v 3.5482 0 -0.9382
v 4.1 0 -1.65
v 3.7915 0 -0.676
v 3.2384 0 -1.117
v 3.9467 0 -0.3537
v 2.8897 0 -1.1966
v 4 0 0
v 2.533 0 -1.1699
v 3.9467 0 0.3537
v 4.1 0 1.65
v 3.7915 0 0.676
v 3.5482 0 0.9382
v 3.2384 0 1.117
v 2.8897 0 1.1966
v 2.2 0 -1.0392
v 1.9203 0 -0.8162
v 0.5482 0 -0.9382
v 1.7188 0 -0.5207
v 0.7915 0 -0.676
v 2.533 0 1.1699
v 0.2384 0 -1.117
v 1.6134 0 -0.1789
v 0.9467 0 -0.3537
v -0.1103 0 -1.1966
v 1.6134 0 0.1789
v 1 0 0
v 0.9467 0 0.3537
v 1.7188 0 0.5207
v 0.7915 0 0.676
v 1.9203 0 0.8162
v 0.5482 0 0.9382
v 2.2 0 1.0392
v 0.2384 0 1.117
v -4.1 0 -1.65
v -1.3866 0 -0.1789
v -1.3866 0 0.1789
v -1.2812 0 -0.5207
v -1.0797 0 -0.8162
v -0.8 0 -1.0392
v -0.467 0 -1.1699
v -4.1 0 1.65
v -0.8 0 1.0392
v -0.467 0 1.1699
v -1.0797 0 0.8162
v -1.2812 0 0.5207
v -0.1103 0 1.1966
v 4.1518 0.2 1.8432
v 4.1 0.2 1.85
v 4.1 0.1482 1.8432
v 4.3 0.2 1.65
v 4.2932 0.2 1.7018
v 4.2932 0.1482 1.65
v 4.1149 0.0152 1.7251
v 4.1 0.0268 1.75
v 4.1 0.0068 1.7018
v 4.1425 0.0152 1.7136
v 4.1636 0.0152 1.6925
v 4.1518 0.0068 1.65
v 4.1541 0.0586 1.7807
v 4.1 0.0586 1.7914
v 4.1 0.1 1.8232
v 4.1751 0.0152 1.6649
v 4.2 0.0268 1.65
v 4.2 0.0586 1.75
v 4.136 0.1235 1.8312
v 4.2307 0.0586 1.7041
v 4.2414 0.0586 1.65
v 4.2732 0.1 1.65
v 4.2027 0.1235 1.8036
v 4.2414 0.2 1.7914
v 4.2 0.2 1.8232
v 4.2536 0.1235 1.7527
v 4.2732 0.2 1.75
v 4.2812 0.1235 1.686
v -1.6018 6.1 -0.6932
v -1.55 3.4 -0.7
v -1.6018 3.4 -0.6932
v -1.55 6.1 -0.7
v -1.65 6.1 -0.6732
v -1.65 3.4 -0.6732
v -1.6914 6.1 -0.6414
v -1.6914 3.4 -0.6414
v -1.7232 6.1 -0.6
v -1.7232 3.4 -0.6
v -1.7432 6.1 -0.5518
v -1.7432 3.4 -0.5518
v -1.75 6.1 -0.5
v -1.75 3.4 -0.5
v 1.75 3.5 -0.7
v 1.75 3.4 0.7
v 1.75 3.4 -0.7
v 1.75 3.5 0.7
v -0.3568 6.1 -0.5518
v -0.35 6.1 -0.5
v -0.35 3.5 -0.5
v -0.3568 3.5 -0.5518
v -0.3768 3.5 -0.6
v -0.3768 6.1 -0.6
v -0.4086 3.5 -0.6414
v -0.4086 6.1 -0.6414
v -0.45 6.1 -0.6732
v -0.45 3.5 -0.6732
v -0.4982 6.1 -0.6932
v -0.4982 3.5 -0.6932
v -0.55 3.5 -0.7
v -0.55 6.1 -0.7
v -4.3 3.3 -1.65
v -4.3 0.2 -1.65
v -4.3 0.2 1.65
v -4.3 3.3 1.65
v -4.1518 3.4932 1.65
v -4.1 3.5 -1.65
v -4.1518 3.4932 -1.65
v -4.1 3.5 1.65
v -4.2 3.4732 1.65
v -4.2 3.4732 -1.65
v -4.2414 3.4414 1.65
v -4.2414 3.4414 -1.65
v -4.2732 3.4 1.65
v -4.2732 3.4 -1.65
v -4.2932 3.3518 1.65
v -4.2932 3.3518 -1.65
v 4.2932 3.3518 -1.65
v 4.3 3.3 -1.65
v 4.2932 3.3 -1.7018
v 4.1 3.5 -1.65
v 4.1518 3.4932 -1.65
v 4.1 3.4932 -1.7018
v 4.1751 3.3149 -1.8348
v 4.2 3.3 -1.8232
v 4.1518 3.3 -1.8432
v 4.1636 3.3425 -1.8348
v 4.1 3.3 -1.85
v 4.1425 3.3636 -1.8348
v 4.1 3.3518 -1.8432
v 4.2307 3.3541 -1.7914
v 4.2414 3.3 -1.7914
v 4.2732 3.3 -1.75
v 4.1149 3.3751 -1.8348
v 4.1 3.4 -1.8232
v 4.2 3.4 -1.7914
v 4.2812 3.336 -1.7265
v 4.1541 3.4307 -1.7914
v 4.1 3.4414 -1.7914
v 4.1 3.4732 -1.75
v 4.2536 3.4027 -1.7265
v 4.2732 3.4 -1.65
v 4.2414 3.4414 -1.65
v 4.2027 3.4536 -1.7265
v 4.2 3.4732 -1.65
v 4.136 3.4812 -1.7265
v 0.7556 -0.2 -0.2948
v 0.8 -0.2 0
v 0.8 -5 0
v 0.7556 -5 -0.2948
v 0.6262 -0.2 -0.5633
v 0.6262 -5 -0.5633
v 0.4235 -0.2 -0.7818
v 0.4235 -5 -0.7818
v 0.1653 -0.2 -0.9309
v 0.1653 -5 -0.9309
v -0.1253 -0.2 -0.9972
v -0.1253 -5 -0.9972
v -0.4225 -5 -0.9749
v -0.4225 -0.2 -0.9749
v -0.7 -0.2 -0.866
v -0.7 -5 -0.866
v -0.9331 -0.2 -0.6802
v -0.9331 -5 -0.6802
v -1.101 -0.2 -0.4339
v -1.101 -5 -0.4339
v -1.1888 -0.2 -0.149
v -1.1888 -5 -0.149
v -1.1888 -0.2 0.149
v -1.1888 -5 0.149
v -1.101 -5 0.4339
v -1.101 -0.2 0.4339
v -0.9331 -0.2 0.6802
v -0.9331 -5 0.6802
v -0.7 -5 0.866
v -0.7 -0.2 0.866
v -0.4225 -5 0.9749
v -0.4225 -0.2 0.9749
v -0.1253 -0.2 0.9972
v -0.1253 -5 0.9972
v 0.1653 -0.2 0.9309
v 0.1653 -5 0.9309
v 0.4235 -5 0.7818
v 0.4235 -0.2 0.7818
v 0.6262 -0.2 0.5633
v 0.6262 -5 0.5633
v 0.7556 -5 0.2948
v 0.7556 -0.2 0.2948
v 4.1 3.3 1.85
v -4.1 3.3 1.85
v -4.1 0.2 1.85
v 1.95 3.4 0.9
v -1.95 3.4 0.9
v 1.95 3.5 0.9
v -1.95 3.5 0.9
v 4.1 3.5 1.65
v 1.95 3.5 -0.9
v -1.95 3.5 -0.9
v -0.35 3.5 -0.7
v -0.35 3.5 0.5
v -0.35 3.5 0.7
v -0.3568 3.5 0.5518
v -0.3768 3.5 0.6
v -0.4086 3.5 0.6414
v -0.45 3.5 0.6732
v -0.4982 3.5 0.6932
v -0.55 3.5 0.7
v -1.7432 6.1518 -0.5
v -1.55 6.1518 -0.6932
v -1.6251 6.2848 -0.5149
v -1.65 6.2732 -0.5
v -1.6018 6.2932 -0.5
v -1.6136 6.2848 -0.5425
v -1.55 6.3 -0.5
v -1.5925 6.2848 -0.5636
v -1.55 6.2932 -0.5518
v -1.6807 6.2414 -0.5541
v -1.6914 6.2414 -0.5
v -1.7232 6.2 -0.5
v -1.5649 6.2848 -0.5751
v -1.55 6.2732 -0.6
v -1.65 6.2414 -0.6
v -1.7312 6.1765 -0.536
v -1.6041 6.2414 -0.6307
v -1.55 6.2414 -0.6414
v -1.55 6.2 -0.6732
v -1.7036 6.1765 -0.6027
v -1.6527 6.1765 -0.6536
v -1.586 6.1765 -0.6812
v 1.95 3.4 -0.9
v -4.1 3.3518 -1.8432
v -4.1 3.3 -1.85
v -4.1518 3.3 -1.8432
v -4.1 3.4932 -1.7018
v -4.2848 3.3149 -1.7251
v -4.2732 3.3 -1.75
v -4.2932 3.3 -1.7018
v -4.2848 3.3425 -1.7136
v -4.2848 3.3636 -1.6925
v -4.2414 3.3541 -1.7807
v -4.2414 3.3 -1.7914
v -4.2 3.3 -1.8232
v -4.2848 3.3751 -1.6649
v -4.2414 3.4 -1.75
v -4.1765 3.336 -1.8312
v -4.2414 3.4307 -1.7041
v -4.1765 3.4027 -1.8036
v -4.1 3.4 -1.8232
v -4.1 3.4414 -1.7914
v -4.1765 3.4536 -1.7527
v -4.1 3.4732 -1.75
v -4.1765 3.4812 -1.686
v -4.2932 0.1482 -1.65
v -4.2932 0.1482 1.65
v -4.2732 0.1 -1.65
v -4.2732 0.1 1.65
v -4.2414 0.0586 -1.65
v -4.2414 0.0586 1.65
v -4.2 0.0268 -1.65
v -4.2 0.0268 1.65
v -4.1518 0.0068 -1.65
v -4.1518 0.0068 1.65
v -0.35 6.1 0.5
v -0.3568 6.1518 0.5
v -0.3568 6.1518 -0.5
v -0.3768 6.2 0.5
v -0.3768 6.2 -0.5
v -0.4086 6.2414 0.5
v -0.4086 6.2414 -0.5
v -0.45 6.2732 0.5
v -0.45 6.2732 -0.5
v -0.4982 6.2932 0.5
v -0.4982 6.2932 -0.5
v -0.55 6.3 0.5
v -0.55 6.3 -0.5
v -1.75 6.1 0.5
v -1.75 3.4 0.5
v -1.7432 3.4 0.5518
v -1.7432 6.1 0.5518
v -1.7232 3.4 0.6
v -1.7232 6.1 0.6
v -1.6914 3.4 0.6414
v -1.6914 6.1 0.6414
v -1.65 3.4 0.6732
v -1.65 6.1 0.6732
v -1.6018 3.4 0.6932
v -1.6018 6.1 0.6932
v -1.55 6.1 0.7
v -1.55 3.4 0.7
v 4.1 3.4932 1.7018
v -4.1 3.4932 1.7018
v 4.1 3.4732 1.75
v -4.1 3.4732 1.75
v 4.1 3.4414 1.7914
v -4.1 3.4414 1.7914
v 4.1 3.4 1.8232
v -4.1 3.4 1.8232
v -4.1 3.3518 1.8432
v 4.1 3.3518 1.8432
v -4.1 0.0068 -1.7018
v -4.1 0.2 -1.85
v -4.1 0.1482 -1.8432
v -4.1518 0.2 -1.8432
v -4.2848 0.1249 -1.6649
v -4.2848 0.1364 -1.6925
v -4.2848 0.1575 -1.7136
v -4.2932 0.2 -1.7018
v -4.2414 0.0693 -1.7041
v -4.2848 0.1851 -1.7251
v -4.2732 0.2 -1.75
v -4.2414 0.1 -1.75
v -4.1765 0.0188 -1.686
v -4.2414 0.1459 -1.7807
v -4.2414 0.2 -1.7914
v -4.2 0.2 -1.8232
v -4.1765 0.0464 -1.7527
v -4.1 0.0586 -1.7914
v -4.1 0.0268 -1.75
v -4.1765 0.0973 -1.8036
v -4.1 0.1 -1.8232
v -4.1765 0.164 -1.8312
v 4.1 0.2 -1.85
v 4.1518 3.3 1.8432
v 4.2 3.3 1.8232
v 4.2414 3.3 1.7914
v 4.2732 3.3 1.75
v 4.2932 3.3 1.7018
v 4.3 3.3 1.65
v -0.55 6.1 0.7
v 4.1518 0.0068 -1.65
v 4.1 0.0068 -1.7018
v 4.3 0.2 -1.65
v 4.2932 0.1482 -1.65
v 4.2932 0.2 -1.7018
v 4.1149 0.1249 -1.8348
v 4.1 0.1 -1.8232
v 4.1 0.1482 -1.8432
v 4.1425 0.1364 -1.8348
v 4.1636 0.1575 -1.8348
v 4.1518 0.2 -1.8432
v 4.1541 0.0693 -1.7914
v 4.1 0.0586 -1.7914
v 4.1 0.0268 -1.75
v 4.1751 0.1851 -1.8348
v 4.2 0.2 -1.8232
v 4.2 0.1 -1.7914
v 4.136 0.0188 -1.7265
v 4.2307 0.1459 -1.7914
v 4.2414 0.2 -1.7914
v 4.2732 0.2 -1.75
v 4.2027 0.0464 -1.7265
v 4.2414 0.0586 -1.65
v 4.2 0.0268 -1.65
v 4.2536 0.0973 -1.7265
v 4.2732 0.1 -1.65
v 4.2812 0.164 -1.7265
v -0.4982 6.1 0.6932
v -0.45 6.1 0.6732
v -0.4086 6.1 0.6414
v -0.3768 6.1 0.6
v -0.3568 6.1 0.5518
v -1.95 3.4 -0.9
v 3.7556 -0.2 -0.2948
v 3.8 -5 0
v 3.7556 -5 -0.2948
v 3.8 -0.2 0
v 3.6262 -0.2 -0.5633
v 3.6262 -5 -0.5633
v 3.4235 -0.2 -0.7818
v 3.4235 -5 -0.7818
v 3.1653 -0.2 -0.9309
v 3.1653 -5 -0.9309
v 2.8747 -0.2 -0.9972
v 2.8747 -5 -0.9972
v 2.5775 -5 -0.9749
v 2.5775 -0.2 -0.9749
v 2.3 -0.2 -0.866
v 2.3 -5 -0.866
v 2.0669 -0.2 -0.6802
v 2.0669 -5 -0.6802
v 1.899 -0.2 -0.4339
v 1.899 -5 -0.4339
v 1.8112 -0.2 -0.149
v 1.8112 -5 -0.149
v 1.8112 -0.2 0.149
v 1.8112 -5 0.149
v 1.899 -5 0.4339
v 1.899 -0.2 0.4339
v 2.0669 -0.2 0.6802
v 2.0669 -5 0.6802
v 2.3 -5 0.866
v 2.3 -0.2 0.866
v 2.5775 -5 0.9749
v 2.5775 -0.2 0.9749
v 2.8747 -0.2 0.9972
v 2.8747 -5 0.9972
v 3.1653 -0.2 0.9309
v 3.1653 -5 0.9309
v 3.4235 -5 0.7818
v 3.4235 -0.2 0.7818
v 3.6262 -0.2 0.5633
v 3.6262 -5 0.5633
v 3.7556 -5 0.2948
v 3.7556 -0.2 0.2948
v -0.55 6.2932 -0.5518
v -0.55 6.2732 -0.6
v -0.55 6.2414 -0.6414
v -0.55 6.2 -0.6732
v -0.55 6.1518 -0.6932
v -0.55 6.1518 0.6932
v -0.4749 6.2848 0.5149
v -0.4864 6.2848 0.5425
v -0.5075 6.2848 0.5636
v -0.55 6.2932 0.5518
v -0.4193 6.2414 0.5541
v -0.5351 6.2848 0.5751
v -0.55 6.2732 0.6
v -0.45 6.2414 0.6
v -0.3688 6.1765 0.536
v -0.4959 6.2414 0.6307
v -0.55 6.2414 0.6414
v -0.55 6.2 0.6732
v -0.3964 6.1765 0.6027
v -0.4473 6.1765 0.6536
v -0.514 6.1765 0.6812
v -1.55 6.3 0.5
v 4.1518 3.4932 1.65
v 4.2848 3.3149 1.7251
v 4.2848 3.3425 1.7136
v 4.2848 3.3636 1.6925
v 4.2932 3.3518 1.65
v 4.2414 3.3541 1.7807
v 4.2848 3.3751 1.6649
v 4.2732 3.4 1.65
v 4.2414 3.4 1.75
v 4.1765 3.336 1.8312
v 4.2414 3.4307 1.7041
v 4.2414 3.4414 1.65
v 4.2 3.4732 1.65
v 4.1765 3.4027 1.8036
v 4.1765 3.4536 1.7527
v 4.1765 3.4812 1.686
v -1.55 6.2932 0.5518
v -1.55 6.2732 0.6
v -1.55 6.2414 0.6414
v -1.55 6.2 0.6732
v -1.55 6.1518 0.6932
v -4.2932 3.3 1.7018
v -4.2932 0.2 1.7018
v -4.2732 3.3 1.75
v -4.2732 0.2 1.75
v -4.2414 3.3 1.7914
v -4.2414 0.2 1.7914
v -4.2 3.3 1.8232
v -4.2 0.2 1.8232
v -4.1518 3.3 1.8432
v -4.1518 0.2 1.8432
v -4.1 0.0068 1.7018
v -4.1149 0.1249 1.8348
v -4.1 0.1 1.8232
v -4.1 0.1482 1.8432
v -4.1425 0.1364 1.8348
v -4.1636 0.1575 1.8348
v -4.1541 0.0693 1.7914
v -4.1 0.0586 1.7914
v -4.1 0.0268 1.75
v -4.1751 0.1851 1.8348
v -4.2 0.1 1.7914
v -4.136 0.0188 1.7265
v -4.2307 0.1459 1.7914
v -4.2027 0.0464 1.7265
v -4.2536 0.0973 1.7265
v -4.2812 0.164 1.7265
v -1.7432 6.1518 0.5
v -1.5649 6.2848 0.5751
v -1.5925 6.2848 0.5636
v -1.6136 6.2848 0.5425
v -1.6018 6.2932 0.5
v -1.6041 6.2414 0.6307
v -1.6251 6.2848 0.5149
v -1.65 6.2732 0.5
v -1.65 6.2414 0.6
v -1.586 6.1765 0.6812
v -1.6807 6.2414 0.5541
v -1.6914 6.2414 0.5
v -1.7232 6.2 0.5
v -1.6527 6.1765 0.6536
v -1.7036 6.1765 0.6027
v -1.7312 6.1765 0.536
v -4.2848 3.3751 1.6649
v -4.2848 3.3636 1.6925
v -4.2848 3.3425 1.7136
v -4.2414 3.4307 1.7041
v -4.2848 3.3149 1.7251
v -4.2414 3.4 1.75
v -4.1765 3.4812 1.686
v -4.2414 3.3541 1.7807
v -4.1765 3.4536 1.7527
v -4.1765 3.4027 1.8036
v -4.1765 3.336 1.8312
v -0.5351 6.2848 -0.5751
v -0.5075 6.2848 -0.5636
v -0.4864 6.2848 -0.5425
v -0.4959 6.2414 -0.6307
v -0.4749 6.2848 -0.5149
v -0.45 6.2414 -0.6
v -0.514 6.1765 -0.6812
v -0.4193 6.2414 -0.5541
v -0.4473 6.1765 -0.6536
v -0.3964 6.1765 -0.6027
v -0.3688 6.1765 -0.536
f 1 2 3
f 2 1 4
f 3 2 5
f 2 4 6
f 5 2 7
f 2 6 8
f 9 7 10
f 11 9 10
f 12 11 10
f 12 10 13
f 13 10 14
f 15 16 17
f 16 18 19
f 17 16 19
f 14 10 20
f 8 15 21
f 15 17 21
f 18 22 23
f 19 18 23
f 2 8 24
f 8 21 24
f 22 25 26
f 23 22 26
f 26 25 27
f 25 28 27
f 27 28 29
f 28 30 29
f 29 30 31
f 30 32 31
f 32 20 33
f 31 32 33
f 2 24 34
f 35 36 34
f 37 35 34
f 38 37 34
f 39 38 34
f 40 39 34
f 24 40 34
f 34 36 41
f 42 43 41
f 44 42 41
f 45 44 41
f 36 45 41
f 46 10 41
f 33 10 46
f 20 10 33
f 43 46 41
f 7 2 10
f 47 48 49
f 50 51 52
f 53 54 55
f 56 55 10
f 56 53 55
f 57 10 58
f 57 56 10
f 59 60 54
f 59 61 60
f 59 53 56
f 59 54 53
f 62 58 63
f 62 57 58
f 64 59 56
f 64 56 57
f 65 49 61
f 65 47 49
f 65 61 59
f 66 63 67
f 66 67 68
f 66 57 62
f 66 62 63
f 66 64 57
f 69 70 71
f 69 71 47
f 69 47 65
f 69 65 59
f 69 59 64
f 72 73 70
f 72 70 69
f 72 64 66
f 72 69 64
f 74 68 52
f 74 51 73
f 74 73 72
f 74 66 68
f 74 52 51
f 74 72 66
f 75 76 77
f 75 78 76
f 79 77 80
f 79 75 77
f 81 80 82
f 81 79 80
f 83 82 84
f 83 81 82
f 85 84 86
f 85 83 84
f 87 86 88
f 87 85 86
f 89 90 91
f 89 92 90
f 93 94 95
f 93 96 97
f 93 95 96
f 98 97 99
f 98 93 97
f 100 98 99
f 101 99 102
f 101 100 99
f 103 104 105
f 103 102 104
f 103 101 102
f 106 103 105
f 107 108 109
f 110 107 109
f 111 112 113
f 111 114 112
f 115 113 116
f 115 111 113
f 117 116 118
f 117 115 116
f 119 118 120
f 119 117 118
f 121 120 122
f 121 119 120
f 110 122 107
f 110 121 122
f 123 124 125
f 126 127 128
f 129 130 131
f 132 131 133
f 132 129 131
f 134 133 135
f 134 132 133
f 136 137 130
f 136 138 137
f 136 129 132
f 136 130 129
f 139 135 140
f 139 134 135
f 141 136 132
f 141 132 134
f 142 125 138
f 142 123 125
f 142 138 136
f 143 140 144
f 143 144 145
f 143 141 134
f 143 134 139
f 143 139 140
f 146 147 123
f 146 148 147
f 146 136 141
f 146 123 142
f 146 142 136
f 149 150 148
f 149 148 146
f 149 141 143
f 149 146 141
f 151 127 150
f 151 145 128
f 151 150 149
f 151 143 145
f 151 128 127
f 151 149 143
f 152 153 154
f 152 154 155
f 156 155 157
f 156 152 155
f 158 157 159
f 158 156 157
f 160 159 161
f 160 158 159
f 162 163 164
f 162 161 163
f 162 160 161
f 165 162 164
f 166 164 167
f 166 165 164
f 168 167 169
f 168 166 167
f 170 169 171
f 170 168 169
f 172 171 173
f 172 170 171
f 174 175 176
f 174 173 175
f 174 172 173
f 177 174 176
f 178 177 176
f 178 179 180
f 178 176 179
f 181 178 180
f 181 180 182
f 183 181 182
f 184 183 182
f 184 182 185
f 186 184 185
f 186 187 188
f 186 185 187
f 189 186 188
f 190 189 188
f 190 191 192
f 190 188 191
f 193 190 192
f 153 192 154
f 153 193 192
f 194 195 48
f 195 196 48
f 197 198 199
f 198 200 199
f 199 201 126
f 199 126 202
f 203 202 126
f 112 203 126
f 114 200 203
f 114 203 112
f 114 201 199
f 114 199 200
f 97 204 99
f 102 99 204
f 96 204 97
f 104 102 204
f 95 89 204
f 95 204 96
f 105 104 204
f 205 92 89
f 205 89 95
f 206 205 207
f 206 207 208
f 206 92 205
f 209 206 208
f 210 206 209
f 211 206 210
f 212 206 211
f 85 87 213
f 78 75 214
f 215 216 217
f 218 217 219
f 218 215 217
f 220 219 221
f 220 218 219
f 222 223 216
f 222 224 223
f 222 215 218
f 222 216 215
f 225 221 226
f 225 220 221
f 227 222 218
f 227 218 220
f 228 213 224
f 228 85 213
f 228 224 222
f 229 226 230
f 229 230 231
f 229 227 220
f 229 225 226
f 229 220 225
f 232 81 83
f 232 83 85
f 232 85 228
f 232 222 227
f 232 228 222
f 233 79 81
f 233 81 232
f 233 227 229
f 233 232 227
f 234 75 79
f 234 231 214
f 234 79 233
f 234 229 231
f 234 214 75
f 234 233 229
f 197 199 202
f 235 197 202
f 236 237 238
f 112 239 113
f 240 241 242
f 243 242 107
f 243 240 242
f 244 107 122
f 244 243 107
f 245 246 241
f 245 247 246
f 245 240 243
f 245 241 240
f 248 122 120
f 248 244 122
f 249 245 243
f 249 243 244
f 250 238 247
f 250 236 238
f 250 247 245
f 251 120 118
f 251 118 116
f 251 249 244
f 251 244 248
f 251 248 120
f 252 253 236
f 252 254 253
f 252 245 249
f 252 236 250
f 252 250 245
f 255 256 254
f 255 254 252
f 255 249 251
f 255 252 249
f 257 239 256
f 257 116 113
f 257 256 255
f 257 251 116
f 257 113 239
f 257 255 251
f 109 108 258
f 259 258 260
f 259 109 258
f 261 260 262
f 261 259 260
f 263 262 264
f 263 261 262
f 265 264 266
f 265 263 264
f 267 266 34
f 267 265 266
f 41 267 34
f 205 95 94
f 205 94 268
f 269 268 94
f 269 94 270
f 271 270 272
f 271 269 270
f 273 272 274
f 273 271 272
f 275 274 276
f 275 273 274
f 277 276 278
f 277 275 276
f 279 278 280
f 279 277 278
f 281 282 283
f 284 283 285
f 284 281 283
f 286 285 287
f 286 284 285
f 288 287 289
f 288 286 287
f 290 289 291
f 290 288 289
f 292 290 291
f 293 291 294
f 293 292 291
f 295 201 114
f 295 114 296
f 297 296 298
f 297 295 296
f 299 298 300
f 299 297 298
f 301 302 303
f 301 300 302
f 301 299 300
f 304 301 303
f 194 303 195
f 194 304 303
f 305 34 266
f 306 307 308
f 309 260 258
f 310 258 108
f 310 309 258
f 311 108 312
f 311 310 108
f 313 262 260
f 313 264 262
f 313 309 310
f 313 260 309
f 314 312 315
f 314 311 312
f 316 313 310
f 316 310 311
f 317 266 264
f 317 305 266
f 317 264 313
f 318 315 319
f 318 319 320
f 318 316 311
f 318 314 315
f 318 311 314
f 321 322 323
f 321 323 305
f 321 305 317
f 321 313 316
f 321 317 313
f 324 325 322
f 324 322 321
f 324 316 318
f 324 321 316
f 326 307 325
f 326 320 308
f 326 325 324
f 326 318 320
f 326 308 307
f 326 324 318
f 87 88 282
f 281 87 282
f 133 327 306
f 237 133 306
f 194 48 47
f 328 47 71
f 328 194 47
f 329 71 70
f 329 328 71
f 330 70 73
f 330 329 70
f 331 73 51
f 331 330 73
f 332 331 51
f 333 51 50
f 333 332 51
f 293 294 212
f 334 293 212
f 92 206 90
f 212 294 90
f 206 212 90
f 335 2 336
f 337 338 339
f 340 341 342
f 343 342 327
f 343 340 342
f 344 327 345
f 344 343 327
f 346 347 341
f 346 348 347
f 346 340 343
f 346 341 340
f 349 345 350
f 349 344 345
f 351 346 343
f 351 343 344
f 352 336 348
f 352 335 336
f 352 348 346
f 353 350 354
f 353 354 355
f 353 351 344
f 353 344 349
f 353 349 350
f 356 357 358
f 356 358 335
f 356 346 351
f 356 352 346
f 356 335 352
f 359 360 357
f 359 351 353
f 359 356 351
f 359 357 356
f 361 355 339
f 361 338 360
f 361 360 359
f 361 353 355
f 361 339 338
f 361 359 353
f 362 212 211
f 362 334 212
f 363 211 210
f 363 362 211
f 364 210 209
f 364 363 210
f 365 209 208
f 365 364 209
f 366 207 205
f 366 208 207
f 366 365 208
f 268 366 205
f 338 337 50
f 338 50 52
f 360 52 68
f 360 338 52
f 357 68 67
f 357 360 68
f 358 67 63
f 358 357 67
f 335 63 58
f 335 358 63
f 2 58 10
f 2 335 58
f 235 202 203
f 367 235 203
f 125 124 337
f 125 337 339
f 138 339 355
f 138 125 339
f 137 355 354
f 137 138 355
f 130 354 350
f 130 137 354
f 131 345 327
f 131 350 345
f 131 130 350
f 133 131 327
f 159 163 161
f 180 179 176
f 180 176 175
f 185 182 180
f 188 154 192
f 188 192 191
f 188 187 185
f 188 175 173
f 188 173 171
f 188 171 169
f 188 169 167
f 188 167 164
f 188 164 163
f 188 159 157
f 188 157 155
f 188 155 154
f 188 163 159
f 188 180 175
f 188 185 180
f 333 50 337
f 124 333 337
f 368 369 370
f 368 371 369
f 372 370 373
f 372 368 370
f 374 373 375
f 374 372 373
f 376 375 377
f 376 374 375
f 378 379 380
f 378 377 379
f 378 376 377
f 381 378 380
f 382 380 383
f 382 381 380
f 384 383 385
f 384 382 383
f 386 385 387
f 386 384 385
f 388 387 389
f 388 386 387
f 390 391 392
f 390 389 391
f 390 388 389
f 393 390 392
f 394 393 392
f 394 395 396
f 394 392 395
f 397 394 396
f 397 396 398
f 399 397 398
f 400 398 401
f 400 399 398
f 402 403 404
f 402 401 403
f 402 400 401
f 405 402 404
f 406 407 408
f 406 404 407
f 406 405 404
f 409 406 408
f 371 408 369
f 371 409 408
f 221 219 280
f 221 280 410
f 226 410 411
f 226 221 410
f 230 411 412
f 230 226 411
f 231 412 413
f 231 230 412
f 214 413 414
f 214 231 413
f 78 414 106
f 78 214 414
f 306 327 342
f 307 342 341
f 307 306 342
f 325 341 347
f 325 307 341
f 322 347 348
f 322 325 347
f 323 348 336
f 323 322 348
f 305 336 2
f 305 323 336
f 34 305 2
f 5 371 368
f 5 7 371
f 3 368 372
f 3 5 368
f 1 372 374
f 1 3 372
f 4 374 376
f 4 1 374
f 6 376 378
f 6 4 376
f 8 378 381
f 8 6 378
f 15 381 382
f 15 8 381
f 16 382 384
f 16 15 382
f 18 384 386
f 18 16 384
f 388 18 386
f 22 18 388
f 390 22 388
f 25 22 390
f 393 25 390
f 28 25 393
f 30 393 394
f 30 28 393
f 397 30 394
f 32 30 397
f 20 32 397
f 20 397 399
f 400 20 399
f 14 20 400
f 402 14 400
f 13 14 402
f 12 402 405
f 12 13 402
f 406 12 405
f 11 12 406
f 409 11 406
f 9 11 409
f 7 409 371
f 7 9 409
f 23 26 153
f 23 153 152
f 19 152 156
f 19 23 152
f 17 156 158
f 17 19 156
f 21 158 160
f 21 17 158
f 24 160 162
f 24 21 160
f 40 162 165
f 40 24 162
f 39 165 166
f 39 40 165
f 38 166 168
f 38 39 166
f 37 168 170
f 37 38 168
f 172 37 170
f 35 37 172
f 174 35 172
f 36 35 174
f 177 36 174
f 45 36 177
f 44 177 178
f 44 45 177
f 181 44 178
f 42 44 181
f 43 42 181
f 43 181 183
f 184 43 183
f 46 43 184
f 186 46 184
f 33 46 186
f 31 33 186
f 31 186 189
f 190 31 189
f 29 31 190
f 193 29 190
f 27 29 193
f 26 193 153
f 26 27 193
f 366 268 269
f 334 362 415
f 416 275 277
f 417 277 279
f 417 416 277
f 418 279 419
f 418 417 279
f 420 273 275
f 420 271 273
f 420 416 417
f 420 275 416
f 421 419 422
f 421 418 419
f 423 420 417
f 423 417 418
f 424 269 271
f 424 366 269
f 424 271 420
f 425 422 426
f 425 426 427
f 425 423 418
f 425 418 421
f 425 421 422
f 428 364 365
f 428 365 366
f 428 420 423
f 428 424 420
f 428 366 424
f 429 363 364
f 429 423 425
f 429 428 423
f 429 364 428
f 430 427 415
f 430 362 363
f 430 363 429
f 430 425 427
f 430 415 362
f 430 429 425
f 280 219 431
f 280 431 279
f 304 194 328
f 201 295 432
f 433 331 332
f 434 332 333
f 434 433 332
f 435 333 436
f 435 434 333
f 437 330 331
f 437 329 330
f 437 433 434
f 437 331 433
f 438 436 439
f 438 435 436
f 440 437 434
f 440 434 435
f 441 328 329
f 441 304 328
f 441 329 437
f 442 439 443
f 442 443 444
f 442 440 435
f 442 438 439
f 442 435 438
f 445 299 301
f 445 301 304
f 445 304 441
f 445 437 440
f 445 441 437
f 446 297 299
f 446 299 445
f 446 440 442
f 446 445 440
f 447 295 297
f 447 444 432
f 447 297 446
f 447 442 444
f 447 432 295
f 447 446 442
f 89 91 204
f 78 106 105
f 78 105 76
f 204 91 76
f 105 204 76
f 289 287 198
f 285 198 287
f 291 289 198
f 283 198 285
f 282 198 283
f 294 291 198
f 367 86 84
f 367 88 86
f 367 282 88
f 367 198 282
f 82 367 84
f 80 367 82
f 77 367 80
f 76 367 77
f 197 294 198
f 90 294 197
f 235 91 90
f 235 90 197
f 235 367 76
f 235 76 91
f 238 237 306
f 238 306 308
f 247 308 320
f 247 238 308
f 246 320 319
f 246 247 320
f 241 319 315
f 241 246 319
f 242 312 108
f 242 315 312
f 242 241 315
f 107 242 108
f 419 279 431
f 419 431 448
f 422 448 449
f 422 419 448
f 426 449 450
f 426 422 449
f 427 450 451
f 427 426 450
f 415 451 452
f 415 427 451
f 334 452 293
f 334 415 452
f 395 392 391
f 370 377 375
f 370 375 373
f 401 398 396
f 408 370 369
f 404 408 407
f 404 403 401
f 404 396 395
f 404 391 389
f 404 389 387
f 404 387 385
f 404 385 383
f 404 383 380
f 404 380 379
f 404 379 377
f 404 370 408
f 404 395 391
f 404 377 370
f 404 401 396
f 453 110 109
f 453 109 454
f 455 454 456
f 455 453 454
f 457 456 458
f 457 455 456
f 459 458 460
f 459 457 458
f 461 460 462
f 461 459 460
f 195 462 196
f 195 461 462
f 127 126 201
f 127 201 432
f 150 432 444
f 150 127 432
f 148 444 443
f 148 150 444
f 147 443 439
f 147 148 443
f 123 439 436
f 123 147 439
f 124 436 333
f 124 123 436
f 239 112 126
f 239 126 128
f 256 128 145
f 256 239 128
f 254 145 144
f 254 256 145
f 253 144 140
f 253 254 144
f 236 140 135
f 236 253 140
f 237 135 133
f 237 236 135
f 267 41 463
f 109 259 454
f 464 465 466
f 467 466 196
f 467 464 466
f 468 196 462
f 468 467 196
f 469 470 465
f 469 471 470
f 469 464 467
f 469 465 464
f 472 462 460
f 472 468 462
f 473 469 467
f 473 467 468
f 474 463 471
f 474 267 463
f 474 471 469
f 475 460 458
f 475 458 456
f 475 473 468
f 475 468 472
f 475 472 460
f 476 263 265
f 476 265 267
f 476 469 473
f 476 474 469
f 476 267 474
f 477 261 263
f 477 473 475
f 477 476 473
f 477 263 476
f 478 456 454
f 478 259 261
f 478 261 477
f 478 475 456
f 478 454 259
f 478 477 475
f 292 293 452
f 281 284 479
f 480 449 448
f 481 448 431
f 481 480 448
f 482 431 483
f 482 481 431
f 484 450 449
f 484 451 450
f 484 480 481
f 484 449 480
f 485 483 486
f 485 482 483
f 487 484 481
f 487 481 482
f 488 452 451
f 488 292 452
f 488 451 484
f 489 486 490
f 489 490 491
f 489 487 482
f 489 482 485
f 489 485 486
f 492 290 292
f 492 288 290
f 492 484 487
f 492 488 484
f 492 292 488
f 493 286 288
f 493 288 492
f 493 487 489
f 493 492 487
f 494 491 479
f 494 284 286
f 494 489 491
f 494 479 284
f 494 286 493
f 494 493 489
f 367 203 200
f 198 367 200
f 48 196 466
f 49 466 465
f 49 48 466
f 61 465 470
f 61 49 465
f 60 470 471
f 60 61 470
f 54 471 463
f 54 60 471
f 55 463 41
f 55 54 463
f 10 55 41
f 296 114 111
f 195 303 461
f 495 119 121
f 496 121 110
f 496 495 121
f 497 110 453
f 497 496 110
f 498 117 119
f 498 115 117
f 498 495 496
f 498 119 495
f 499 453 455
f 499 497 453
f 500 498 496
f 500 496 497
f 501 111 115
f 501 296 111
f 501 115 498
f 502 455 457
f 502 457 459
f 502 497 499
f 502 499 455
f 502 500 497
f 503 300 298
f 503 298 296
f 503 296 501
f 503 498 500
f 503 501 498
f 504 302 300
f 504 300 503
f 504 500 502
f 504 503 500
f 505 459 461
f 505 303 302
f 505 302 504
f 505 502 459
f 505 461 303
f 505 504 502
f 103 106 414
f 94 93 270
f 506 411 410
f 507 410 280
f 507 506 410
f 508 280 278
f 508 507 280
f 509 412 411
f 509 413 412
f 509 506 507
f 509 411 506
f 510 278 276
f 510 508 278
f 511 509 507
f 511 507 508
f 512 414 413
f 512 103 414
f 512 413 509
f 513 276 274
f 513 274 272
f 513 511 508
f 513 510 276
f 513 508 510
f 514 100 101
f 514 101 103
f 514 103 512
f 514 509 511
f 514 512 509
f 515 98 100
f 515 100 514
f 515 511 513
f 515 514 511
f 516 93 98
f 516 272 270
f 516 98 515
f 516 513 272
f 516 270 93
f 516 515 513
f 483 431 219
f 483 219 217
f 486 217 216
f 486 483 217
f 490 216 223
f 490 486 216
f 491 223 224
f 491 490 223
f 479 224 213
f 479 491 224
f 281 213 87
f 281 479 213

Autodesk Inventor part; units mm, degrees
ref_plane "YZ Plane" through (0, 0, 0) normal (1, 0, 0) x (0, 1, 0)
ref_plane "XZ Plane" through (0, 0, 0) normal (0, 1, 0) x (-1, 0, 0)
ref_plane "XY Plane" through (0, 0, 0) normal (0, 0, 1) x (1, 0, 0)
sketch "Skizze1" plane through (0, 0, 0) normal (0, 1, 0) x (-1, 0, 0)
  line L0 (4.3, 1.85) -> (-4.3, 1.85)
  line L1 (-4.3, 1.85) -> (-4.3, -1.85)
  line L2 (-4.3, -1.85) -> (4.3, -1.85)
  line L3 (4.3, -1.85) -> (4.3, 1.85)
  line L4 (4.3, 1.85) -> (-4.3, -1.85) construction
  line L5 (-4.3, 1.85) -> (4.3, -1.85) construction
  point P0 (0, 0)
  dimension "d0" = 8.6
  dimension "d1" = 3.7
extrude "Extrusion1" add sketch "Skizze1" along normal blind 3.5
sketch "Skizze2" plane through (0, 3.5, 0) normal (0, 1, 0) x (1, 0, 0)
  line L0 (-1.75, -0.7) -> (1.75, -0.7)
  line L1 (1.75, -0.7) -> (1.75, 0.7)
  line L2 (1.75, 0.7) -> (-1.75, 0.7)
  line L3 (-1.75, 0.7) -> (-1.75, -0.7)
  line L4 (-1.75, -0.7) -> (1.75, 0.7) construction
  line L5 (1.75, -0.7) -> (-1.75, 0.7) construction
  line L6 (-1.95, -0.9) -> (1.95, -0.9)
  line L7 (1.95, -0.9) -> (1.95, 0.9)
  line L8 (1.95, 0.9) -> (-1.95, 0.9)
  line L9 (-1.95, 0.9) -> (-1.95, -0.9)
  line L10 (-1.95, -0.9) -> (1.95, 0.9) construction
  line L11 (1.95, -0.9) -> (-1.95, 0.9) construction
  point P0 (0, 0)
  dimension "d4" = 1.4
  dimension "d5" = 3.5
  dimension "d6" = 0.2
  dimension "d7" = 0.2
extrude "Extrusion2" cut sketch "Skizze2" against normal blind 0.1
sketch "Skizze3" plane through (0, 3.5, 0) normal (0, 1, 0) x (1, 0, 0)
  line L0 (-1.75, 0.7) -> (-1.75, -0.7) projected
  line L1 (1.75, 0.7) -> (-1.75, 0.7) projected
  line L2 (-1.75, -0.7) -> (1.75, -0.7) projected
  line L3 (-1.75, 0.7) -> (-0.35, 0.7)
  line L4 (-0.35, 0.7) -> (-0.35, -0.7)
  line L5 (-0.35, -0.7) -> (-1.75, -0.7)
  line L6 (-1.75, -0.7) -> (-1.75, 0.7)
  point P0 (0, 0)
  dimension "d10" = 1.4
extrude "Extrusion3" add sketch "Skizze3" along normal blind 2.8
sketch "Skizze4" plane through (0, 0, 0) normal (0, -1, 0) x (1, 0, 0)
  circle A0 centre (-0.2, 0) radius 1
  circle A1 centre (2.8, 0) radius 1
  line L0 (4.3, 1.85) -> (4.3, -1.85) projected
  point P0 (0, 0)
  dimension "d16" = 1.5
  dimension "d17" = 3
  dimension "d18" = 2
extrude "Extrusion4" add sketch "Skizze4" along normal blind 5
fillet "Rundung1" radius 0.2 20 edges at (0, 3.5, 1.85) (4.3, 3.5, 0) (4.3, 1.75, 1.85) (4.3, 0, 0) (4.3, 1.75, -1.85) (0, 3.5, -1.85) (0, 0, -1.85) (-4.3, 1.75, -1.85) (-4.3, 0, 0) (-4.3, 1.75, 1.85) (-4.3, 3.5, 0) (0, 0, 1.85) (-0.35, 4.9, -0.7) (-1.75, 4.85, -0.7) (-1.75, 4.85, 0.7) (-0.35, 4.9, 0.7) (-1.05, 6.3, 0.7) (-0.35, 6.3, 0) (-1.05, 6.3, -0.7) (-1.75, 6.3, 0)
chamfer "Fasen1" distance 0.2 angle 45 2 edges at (-1.2, 0, 0) (1.8, 0, 0)
properties part number "Schalter"
